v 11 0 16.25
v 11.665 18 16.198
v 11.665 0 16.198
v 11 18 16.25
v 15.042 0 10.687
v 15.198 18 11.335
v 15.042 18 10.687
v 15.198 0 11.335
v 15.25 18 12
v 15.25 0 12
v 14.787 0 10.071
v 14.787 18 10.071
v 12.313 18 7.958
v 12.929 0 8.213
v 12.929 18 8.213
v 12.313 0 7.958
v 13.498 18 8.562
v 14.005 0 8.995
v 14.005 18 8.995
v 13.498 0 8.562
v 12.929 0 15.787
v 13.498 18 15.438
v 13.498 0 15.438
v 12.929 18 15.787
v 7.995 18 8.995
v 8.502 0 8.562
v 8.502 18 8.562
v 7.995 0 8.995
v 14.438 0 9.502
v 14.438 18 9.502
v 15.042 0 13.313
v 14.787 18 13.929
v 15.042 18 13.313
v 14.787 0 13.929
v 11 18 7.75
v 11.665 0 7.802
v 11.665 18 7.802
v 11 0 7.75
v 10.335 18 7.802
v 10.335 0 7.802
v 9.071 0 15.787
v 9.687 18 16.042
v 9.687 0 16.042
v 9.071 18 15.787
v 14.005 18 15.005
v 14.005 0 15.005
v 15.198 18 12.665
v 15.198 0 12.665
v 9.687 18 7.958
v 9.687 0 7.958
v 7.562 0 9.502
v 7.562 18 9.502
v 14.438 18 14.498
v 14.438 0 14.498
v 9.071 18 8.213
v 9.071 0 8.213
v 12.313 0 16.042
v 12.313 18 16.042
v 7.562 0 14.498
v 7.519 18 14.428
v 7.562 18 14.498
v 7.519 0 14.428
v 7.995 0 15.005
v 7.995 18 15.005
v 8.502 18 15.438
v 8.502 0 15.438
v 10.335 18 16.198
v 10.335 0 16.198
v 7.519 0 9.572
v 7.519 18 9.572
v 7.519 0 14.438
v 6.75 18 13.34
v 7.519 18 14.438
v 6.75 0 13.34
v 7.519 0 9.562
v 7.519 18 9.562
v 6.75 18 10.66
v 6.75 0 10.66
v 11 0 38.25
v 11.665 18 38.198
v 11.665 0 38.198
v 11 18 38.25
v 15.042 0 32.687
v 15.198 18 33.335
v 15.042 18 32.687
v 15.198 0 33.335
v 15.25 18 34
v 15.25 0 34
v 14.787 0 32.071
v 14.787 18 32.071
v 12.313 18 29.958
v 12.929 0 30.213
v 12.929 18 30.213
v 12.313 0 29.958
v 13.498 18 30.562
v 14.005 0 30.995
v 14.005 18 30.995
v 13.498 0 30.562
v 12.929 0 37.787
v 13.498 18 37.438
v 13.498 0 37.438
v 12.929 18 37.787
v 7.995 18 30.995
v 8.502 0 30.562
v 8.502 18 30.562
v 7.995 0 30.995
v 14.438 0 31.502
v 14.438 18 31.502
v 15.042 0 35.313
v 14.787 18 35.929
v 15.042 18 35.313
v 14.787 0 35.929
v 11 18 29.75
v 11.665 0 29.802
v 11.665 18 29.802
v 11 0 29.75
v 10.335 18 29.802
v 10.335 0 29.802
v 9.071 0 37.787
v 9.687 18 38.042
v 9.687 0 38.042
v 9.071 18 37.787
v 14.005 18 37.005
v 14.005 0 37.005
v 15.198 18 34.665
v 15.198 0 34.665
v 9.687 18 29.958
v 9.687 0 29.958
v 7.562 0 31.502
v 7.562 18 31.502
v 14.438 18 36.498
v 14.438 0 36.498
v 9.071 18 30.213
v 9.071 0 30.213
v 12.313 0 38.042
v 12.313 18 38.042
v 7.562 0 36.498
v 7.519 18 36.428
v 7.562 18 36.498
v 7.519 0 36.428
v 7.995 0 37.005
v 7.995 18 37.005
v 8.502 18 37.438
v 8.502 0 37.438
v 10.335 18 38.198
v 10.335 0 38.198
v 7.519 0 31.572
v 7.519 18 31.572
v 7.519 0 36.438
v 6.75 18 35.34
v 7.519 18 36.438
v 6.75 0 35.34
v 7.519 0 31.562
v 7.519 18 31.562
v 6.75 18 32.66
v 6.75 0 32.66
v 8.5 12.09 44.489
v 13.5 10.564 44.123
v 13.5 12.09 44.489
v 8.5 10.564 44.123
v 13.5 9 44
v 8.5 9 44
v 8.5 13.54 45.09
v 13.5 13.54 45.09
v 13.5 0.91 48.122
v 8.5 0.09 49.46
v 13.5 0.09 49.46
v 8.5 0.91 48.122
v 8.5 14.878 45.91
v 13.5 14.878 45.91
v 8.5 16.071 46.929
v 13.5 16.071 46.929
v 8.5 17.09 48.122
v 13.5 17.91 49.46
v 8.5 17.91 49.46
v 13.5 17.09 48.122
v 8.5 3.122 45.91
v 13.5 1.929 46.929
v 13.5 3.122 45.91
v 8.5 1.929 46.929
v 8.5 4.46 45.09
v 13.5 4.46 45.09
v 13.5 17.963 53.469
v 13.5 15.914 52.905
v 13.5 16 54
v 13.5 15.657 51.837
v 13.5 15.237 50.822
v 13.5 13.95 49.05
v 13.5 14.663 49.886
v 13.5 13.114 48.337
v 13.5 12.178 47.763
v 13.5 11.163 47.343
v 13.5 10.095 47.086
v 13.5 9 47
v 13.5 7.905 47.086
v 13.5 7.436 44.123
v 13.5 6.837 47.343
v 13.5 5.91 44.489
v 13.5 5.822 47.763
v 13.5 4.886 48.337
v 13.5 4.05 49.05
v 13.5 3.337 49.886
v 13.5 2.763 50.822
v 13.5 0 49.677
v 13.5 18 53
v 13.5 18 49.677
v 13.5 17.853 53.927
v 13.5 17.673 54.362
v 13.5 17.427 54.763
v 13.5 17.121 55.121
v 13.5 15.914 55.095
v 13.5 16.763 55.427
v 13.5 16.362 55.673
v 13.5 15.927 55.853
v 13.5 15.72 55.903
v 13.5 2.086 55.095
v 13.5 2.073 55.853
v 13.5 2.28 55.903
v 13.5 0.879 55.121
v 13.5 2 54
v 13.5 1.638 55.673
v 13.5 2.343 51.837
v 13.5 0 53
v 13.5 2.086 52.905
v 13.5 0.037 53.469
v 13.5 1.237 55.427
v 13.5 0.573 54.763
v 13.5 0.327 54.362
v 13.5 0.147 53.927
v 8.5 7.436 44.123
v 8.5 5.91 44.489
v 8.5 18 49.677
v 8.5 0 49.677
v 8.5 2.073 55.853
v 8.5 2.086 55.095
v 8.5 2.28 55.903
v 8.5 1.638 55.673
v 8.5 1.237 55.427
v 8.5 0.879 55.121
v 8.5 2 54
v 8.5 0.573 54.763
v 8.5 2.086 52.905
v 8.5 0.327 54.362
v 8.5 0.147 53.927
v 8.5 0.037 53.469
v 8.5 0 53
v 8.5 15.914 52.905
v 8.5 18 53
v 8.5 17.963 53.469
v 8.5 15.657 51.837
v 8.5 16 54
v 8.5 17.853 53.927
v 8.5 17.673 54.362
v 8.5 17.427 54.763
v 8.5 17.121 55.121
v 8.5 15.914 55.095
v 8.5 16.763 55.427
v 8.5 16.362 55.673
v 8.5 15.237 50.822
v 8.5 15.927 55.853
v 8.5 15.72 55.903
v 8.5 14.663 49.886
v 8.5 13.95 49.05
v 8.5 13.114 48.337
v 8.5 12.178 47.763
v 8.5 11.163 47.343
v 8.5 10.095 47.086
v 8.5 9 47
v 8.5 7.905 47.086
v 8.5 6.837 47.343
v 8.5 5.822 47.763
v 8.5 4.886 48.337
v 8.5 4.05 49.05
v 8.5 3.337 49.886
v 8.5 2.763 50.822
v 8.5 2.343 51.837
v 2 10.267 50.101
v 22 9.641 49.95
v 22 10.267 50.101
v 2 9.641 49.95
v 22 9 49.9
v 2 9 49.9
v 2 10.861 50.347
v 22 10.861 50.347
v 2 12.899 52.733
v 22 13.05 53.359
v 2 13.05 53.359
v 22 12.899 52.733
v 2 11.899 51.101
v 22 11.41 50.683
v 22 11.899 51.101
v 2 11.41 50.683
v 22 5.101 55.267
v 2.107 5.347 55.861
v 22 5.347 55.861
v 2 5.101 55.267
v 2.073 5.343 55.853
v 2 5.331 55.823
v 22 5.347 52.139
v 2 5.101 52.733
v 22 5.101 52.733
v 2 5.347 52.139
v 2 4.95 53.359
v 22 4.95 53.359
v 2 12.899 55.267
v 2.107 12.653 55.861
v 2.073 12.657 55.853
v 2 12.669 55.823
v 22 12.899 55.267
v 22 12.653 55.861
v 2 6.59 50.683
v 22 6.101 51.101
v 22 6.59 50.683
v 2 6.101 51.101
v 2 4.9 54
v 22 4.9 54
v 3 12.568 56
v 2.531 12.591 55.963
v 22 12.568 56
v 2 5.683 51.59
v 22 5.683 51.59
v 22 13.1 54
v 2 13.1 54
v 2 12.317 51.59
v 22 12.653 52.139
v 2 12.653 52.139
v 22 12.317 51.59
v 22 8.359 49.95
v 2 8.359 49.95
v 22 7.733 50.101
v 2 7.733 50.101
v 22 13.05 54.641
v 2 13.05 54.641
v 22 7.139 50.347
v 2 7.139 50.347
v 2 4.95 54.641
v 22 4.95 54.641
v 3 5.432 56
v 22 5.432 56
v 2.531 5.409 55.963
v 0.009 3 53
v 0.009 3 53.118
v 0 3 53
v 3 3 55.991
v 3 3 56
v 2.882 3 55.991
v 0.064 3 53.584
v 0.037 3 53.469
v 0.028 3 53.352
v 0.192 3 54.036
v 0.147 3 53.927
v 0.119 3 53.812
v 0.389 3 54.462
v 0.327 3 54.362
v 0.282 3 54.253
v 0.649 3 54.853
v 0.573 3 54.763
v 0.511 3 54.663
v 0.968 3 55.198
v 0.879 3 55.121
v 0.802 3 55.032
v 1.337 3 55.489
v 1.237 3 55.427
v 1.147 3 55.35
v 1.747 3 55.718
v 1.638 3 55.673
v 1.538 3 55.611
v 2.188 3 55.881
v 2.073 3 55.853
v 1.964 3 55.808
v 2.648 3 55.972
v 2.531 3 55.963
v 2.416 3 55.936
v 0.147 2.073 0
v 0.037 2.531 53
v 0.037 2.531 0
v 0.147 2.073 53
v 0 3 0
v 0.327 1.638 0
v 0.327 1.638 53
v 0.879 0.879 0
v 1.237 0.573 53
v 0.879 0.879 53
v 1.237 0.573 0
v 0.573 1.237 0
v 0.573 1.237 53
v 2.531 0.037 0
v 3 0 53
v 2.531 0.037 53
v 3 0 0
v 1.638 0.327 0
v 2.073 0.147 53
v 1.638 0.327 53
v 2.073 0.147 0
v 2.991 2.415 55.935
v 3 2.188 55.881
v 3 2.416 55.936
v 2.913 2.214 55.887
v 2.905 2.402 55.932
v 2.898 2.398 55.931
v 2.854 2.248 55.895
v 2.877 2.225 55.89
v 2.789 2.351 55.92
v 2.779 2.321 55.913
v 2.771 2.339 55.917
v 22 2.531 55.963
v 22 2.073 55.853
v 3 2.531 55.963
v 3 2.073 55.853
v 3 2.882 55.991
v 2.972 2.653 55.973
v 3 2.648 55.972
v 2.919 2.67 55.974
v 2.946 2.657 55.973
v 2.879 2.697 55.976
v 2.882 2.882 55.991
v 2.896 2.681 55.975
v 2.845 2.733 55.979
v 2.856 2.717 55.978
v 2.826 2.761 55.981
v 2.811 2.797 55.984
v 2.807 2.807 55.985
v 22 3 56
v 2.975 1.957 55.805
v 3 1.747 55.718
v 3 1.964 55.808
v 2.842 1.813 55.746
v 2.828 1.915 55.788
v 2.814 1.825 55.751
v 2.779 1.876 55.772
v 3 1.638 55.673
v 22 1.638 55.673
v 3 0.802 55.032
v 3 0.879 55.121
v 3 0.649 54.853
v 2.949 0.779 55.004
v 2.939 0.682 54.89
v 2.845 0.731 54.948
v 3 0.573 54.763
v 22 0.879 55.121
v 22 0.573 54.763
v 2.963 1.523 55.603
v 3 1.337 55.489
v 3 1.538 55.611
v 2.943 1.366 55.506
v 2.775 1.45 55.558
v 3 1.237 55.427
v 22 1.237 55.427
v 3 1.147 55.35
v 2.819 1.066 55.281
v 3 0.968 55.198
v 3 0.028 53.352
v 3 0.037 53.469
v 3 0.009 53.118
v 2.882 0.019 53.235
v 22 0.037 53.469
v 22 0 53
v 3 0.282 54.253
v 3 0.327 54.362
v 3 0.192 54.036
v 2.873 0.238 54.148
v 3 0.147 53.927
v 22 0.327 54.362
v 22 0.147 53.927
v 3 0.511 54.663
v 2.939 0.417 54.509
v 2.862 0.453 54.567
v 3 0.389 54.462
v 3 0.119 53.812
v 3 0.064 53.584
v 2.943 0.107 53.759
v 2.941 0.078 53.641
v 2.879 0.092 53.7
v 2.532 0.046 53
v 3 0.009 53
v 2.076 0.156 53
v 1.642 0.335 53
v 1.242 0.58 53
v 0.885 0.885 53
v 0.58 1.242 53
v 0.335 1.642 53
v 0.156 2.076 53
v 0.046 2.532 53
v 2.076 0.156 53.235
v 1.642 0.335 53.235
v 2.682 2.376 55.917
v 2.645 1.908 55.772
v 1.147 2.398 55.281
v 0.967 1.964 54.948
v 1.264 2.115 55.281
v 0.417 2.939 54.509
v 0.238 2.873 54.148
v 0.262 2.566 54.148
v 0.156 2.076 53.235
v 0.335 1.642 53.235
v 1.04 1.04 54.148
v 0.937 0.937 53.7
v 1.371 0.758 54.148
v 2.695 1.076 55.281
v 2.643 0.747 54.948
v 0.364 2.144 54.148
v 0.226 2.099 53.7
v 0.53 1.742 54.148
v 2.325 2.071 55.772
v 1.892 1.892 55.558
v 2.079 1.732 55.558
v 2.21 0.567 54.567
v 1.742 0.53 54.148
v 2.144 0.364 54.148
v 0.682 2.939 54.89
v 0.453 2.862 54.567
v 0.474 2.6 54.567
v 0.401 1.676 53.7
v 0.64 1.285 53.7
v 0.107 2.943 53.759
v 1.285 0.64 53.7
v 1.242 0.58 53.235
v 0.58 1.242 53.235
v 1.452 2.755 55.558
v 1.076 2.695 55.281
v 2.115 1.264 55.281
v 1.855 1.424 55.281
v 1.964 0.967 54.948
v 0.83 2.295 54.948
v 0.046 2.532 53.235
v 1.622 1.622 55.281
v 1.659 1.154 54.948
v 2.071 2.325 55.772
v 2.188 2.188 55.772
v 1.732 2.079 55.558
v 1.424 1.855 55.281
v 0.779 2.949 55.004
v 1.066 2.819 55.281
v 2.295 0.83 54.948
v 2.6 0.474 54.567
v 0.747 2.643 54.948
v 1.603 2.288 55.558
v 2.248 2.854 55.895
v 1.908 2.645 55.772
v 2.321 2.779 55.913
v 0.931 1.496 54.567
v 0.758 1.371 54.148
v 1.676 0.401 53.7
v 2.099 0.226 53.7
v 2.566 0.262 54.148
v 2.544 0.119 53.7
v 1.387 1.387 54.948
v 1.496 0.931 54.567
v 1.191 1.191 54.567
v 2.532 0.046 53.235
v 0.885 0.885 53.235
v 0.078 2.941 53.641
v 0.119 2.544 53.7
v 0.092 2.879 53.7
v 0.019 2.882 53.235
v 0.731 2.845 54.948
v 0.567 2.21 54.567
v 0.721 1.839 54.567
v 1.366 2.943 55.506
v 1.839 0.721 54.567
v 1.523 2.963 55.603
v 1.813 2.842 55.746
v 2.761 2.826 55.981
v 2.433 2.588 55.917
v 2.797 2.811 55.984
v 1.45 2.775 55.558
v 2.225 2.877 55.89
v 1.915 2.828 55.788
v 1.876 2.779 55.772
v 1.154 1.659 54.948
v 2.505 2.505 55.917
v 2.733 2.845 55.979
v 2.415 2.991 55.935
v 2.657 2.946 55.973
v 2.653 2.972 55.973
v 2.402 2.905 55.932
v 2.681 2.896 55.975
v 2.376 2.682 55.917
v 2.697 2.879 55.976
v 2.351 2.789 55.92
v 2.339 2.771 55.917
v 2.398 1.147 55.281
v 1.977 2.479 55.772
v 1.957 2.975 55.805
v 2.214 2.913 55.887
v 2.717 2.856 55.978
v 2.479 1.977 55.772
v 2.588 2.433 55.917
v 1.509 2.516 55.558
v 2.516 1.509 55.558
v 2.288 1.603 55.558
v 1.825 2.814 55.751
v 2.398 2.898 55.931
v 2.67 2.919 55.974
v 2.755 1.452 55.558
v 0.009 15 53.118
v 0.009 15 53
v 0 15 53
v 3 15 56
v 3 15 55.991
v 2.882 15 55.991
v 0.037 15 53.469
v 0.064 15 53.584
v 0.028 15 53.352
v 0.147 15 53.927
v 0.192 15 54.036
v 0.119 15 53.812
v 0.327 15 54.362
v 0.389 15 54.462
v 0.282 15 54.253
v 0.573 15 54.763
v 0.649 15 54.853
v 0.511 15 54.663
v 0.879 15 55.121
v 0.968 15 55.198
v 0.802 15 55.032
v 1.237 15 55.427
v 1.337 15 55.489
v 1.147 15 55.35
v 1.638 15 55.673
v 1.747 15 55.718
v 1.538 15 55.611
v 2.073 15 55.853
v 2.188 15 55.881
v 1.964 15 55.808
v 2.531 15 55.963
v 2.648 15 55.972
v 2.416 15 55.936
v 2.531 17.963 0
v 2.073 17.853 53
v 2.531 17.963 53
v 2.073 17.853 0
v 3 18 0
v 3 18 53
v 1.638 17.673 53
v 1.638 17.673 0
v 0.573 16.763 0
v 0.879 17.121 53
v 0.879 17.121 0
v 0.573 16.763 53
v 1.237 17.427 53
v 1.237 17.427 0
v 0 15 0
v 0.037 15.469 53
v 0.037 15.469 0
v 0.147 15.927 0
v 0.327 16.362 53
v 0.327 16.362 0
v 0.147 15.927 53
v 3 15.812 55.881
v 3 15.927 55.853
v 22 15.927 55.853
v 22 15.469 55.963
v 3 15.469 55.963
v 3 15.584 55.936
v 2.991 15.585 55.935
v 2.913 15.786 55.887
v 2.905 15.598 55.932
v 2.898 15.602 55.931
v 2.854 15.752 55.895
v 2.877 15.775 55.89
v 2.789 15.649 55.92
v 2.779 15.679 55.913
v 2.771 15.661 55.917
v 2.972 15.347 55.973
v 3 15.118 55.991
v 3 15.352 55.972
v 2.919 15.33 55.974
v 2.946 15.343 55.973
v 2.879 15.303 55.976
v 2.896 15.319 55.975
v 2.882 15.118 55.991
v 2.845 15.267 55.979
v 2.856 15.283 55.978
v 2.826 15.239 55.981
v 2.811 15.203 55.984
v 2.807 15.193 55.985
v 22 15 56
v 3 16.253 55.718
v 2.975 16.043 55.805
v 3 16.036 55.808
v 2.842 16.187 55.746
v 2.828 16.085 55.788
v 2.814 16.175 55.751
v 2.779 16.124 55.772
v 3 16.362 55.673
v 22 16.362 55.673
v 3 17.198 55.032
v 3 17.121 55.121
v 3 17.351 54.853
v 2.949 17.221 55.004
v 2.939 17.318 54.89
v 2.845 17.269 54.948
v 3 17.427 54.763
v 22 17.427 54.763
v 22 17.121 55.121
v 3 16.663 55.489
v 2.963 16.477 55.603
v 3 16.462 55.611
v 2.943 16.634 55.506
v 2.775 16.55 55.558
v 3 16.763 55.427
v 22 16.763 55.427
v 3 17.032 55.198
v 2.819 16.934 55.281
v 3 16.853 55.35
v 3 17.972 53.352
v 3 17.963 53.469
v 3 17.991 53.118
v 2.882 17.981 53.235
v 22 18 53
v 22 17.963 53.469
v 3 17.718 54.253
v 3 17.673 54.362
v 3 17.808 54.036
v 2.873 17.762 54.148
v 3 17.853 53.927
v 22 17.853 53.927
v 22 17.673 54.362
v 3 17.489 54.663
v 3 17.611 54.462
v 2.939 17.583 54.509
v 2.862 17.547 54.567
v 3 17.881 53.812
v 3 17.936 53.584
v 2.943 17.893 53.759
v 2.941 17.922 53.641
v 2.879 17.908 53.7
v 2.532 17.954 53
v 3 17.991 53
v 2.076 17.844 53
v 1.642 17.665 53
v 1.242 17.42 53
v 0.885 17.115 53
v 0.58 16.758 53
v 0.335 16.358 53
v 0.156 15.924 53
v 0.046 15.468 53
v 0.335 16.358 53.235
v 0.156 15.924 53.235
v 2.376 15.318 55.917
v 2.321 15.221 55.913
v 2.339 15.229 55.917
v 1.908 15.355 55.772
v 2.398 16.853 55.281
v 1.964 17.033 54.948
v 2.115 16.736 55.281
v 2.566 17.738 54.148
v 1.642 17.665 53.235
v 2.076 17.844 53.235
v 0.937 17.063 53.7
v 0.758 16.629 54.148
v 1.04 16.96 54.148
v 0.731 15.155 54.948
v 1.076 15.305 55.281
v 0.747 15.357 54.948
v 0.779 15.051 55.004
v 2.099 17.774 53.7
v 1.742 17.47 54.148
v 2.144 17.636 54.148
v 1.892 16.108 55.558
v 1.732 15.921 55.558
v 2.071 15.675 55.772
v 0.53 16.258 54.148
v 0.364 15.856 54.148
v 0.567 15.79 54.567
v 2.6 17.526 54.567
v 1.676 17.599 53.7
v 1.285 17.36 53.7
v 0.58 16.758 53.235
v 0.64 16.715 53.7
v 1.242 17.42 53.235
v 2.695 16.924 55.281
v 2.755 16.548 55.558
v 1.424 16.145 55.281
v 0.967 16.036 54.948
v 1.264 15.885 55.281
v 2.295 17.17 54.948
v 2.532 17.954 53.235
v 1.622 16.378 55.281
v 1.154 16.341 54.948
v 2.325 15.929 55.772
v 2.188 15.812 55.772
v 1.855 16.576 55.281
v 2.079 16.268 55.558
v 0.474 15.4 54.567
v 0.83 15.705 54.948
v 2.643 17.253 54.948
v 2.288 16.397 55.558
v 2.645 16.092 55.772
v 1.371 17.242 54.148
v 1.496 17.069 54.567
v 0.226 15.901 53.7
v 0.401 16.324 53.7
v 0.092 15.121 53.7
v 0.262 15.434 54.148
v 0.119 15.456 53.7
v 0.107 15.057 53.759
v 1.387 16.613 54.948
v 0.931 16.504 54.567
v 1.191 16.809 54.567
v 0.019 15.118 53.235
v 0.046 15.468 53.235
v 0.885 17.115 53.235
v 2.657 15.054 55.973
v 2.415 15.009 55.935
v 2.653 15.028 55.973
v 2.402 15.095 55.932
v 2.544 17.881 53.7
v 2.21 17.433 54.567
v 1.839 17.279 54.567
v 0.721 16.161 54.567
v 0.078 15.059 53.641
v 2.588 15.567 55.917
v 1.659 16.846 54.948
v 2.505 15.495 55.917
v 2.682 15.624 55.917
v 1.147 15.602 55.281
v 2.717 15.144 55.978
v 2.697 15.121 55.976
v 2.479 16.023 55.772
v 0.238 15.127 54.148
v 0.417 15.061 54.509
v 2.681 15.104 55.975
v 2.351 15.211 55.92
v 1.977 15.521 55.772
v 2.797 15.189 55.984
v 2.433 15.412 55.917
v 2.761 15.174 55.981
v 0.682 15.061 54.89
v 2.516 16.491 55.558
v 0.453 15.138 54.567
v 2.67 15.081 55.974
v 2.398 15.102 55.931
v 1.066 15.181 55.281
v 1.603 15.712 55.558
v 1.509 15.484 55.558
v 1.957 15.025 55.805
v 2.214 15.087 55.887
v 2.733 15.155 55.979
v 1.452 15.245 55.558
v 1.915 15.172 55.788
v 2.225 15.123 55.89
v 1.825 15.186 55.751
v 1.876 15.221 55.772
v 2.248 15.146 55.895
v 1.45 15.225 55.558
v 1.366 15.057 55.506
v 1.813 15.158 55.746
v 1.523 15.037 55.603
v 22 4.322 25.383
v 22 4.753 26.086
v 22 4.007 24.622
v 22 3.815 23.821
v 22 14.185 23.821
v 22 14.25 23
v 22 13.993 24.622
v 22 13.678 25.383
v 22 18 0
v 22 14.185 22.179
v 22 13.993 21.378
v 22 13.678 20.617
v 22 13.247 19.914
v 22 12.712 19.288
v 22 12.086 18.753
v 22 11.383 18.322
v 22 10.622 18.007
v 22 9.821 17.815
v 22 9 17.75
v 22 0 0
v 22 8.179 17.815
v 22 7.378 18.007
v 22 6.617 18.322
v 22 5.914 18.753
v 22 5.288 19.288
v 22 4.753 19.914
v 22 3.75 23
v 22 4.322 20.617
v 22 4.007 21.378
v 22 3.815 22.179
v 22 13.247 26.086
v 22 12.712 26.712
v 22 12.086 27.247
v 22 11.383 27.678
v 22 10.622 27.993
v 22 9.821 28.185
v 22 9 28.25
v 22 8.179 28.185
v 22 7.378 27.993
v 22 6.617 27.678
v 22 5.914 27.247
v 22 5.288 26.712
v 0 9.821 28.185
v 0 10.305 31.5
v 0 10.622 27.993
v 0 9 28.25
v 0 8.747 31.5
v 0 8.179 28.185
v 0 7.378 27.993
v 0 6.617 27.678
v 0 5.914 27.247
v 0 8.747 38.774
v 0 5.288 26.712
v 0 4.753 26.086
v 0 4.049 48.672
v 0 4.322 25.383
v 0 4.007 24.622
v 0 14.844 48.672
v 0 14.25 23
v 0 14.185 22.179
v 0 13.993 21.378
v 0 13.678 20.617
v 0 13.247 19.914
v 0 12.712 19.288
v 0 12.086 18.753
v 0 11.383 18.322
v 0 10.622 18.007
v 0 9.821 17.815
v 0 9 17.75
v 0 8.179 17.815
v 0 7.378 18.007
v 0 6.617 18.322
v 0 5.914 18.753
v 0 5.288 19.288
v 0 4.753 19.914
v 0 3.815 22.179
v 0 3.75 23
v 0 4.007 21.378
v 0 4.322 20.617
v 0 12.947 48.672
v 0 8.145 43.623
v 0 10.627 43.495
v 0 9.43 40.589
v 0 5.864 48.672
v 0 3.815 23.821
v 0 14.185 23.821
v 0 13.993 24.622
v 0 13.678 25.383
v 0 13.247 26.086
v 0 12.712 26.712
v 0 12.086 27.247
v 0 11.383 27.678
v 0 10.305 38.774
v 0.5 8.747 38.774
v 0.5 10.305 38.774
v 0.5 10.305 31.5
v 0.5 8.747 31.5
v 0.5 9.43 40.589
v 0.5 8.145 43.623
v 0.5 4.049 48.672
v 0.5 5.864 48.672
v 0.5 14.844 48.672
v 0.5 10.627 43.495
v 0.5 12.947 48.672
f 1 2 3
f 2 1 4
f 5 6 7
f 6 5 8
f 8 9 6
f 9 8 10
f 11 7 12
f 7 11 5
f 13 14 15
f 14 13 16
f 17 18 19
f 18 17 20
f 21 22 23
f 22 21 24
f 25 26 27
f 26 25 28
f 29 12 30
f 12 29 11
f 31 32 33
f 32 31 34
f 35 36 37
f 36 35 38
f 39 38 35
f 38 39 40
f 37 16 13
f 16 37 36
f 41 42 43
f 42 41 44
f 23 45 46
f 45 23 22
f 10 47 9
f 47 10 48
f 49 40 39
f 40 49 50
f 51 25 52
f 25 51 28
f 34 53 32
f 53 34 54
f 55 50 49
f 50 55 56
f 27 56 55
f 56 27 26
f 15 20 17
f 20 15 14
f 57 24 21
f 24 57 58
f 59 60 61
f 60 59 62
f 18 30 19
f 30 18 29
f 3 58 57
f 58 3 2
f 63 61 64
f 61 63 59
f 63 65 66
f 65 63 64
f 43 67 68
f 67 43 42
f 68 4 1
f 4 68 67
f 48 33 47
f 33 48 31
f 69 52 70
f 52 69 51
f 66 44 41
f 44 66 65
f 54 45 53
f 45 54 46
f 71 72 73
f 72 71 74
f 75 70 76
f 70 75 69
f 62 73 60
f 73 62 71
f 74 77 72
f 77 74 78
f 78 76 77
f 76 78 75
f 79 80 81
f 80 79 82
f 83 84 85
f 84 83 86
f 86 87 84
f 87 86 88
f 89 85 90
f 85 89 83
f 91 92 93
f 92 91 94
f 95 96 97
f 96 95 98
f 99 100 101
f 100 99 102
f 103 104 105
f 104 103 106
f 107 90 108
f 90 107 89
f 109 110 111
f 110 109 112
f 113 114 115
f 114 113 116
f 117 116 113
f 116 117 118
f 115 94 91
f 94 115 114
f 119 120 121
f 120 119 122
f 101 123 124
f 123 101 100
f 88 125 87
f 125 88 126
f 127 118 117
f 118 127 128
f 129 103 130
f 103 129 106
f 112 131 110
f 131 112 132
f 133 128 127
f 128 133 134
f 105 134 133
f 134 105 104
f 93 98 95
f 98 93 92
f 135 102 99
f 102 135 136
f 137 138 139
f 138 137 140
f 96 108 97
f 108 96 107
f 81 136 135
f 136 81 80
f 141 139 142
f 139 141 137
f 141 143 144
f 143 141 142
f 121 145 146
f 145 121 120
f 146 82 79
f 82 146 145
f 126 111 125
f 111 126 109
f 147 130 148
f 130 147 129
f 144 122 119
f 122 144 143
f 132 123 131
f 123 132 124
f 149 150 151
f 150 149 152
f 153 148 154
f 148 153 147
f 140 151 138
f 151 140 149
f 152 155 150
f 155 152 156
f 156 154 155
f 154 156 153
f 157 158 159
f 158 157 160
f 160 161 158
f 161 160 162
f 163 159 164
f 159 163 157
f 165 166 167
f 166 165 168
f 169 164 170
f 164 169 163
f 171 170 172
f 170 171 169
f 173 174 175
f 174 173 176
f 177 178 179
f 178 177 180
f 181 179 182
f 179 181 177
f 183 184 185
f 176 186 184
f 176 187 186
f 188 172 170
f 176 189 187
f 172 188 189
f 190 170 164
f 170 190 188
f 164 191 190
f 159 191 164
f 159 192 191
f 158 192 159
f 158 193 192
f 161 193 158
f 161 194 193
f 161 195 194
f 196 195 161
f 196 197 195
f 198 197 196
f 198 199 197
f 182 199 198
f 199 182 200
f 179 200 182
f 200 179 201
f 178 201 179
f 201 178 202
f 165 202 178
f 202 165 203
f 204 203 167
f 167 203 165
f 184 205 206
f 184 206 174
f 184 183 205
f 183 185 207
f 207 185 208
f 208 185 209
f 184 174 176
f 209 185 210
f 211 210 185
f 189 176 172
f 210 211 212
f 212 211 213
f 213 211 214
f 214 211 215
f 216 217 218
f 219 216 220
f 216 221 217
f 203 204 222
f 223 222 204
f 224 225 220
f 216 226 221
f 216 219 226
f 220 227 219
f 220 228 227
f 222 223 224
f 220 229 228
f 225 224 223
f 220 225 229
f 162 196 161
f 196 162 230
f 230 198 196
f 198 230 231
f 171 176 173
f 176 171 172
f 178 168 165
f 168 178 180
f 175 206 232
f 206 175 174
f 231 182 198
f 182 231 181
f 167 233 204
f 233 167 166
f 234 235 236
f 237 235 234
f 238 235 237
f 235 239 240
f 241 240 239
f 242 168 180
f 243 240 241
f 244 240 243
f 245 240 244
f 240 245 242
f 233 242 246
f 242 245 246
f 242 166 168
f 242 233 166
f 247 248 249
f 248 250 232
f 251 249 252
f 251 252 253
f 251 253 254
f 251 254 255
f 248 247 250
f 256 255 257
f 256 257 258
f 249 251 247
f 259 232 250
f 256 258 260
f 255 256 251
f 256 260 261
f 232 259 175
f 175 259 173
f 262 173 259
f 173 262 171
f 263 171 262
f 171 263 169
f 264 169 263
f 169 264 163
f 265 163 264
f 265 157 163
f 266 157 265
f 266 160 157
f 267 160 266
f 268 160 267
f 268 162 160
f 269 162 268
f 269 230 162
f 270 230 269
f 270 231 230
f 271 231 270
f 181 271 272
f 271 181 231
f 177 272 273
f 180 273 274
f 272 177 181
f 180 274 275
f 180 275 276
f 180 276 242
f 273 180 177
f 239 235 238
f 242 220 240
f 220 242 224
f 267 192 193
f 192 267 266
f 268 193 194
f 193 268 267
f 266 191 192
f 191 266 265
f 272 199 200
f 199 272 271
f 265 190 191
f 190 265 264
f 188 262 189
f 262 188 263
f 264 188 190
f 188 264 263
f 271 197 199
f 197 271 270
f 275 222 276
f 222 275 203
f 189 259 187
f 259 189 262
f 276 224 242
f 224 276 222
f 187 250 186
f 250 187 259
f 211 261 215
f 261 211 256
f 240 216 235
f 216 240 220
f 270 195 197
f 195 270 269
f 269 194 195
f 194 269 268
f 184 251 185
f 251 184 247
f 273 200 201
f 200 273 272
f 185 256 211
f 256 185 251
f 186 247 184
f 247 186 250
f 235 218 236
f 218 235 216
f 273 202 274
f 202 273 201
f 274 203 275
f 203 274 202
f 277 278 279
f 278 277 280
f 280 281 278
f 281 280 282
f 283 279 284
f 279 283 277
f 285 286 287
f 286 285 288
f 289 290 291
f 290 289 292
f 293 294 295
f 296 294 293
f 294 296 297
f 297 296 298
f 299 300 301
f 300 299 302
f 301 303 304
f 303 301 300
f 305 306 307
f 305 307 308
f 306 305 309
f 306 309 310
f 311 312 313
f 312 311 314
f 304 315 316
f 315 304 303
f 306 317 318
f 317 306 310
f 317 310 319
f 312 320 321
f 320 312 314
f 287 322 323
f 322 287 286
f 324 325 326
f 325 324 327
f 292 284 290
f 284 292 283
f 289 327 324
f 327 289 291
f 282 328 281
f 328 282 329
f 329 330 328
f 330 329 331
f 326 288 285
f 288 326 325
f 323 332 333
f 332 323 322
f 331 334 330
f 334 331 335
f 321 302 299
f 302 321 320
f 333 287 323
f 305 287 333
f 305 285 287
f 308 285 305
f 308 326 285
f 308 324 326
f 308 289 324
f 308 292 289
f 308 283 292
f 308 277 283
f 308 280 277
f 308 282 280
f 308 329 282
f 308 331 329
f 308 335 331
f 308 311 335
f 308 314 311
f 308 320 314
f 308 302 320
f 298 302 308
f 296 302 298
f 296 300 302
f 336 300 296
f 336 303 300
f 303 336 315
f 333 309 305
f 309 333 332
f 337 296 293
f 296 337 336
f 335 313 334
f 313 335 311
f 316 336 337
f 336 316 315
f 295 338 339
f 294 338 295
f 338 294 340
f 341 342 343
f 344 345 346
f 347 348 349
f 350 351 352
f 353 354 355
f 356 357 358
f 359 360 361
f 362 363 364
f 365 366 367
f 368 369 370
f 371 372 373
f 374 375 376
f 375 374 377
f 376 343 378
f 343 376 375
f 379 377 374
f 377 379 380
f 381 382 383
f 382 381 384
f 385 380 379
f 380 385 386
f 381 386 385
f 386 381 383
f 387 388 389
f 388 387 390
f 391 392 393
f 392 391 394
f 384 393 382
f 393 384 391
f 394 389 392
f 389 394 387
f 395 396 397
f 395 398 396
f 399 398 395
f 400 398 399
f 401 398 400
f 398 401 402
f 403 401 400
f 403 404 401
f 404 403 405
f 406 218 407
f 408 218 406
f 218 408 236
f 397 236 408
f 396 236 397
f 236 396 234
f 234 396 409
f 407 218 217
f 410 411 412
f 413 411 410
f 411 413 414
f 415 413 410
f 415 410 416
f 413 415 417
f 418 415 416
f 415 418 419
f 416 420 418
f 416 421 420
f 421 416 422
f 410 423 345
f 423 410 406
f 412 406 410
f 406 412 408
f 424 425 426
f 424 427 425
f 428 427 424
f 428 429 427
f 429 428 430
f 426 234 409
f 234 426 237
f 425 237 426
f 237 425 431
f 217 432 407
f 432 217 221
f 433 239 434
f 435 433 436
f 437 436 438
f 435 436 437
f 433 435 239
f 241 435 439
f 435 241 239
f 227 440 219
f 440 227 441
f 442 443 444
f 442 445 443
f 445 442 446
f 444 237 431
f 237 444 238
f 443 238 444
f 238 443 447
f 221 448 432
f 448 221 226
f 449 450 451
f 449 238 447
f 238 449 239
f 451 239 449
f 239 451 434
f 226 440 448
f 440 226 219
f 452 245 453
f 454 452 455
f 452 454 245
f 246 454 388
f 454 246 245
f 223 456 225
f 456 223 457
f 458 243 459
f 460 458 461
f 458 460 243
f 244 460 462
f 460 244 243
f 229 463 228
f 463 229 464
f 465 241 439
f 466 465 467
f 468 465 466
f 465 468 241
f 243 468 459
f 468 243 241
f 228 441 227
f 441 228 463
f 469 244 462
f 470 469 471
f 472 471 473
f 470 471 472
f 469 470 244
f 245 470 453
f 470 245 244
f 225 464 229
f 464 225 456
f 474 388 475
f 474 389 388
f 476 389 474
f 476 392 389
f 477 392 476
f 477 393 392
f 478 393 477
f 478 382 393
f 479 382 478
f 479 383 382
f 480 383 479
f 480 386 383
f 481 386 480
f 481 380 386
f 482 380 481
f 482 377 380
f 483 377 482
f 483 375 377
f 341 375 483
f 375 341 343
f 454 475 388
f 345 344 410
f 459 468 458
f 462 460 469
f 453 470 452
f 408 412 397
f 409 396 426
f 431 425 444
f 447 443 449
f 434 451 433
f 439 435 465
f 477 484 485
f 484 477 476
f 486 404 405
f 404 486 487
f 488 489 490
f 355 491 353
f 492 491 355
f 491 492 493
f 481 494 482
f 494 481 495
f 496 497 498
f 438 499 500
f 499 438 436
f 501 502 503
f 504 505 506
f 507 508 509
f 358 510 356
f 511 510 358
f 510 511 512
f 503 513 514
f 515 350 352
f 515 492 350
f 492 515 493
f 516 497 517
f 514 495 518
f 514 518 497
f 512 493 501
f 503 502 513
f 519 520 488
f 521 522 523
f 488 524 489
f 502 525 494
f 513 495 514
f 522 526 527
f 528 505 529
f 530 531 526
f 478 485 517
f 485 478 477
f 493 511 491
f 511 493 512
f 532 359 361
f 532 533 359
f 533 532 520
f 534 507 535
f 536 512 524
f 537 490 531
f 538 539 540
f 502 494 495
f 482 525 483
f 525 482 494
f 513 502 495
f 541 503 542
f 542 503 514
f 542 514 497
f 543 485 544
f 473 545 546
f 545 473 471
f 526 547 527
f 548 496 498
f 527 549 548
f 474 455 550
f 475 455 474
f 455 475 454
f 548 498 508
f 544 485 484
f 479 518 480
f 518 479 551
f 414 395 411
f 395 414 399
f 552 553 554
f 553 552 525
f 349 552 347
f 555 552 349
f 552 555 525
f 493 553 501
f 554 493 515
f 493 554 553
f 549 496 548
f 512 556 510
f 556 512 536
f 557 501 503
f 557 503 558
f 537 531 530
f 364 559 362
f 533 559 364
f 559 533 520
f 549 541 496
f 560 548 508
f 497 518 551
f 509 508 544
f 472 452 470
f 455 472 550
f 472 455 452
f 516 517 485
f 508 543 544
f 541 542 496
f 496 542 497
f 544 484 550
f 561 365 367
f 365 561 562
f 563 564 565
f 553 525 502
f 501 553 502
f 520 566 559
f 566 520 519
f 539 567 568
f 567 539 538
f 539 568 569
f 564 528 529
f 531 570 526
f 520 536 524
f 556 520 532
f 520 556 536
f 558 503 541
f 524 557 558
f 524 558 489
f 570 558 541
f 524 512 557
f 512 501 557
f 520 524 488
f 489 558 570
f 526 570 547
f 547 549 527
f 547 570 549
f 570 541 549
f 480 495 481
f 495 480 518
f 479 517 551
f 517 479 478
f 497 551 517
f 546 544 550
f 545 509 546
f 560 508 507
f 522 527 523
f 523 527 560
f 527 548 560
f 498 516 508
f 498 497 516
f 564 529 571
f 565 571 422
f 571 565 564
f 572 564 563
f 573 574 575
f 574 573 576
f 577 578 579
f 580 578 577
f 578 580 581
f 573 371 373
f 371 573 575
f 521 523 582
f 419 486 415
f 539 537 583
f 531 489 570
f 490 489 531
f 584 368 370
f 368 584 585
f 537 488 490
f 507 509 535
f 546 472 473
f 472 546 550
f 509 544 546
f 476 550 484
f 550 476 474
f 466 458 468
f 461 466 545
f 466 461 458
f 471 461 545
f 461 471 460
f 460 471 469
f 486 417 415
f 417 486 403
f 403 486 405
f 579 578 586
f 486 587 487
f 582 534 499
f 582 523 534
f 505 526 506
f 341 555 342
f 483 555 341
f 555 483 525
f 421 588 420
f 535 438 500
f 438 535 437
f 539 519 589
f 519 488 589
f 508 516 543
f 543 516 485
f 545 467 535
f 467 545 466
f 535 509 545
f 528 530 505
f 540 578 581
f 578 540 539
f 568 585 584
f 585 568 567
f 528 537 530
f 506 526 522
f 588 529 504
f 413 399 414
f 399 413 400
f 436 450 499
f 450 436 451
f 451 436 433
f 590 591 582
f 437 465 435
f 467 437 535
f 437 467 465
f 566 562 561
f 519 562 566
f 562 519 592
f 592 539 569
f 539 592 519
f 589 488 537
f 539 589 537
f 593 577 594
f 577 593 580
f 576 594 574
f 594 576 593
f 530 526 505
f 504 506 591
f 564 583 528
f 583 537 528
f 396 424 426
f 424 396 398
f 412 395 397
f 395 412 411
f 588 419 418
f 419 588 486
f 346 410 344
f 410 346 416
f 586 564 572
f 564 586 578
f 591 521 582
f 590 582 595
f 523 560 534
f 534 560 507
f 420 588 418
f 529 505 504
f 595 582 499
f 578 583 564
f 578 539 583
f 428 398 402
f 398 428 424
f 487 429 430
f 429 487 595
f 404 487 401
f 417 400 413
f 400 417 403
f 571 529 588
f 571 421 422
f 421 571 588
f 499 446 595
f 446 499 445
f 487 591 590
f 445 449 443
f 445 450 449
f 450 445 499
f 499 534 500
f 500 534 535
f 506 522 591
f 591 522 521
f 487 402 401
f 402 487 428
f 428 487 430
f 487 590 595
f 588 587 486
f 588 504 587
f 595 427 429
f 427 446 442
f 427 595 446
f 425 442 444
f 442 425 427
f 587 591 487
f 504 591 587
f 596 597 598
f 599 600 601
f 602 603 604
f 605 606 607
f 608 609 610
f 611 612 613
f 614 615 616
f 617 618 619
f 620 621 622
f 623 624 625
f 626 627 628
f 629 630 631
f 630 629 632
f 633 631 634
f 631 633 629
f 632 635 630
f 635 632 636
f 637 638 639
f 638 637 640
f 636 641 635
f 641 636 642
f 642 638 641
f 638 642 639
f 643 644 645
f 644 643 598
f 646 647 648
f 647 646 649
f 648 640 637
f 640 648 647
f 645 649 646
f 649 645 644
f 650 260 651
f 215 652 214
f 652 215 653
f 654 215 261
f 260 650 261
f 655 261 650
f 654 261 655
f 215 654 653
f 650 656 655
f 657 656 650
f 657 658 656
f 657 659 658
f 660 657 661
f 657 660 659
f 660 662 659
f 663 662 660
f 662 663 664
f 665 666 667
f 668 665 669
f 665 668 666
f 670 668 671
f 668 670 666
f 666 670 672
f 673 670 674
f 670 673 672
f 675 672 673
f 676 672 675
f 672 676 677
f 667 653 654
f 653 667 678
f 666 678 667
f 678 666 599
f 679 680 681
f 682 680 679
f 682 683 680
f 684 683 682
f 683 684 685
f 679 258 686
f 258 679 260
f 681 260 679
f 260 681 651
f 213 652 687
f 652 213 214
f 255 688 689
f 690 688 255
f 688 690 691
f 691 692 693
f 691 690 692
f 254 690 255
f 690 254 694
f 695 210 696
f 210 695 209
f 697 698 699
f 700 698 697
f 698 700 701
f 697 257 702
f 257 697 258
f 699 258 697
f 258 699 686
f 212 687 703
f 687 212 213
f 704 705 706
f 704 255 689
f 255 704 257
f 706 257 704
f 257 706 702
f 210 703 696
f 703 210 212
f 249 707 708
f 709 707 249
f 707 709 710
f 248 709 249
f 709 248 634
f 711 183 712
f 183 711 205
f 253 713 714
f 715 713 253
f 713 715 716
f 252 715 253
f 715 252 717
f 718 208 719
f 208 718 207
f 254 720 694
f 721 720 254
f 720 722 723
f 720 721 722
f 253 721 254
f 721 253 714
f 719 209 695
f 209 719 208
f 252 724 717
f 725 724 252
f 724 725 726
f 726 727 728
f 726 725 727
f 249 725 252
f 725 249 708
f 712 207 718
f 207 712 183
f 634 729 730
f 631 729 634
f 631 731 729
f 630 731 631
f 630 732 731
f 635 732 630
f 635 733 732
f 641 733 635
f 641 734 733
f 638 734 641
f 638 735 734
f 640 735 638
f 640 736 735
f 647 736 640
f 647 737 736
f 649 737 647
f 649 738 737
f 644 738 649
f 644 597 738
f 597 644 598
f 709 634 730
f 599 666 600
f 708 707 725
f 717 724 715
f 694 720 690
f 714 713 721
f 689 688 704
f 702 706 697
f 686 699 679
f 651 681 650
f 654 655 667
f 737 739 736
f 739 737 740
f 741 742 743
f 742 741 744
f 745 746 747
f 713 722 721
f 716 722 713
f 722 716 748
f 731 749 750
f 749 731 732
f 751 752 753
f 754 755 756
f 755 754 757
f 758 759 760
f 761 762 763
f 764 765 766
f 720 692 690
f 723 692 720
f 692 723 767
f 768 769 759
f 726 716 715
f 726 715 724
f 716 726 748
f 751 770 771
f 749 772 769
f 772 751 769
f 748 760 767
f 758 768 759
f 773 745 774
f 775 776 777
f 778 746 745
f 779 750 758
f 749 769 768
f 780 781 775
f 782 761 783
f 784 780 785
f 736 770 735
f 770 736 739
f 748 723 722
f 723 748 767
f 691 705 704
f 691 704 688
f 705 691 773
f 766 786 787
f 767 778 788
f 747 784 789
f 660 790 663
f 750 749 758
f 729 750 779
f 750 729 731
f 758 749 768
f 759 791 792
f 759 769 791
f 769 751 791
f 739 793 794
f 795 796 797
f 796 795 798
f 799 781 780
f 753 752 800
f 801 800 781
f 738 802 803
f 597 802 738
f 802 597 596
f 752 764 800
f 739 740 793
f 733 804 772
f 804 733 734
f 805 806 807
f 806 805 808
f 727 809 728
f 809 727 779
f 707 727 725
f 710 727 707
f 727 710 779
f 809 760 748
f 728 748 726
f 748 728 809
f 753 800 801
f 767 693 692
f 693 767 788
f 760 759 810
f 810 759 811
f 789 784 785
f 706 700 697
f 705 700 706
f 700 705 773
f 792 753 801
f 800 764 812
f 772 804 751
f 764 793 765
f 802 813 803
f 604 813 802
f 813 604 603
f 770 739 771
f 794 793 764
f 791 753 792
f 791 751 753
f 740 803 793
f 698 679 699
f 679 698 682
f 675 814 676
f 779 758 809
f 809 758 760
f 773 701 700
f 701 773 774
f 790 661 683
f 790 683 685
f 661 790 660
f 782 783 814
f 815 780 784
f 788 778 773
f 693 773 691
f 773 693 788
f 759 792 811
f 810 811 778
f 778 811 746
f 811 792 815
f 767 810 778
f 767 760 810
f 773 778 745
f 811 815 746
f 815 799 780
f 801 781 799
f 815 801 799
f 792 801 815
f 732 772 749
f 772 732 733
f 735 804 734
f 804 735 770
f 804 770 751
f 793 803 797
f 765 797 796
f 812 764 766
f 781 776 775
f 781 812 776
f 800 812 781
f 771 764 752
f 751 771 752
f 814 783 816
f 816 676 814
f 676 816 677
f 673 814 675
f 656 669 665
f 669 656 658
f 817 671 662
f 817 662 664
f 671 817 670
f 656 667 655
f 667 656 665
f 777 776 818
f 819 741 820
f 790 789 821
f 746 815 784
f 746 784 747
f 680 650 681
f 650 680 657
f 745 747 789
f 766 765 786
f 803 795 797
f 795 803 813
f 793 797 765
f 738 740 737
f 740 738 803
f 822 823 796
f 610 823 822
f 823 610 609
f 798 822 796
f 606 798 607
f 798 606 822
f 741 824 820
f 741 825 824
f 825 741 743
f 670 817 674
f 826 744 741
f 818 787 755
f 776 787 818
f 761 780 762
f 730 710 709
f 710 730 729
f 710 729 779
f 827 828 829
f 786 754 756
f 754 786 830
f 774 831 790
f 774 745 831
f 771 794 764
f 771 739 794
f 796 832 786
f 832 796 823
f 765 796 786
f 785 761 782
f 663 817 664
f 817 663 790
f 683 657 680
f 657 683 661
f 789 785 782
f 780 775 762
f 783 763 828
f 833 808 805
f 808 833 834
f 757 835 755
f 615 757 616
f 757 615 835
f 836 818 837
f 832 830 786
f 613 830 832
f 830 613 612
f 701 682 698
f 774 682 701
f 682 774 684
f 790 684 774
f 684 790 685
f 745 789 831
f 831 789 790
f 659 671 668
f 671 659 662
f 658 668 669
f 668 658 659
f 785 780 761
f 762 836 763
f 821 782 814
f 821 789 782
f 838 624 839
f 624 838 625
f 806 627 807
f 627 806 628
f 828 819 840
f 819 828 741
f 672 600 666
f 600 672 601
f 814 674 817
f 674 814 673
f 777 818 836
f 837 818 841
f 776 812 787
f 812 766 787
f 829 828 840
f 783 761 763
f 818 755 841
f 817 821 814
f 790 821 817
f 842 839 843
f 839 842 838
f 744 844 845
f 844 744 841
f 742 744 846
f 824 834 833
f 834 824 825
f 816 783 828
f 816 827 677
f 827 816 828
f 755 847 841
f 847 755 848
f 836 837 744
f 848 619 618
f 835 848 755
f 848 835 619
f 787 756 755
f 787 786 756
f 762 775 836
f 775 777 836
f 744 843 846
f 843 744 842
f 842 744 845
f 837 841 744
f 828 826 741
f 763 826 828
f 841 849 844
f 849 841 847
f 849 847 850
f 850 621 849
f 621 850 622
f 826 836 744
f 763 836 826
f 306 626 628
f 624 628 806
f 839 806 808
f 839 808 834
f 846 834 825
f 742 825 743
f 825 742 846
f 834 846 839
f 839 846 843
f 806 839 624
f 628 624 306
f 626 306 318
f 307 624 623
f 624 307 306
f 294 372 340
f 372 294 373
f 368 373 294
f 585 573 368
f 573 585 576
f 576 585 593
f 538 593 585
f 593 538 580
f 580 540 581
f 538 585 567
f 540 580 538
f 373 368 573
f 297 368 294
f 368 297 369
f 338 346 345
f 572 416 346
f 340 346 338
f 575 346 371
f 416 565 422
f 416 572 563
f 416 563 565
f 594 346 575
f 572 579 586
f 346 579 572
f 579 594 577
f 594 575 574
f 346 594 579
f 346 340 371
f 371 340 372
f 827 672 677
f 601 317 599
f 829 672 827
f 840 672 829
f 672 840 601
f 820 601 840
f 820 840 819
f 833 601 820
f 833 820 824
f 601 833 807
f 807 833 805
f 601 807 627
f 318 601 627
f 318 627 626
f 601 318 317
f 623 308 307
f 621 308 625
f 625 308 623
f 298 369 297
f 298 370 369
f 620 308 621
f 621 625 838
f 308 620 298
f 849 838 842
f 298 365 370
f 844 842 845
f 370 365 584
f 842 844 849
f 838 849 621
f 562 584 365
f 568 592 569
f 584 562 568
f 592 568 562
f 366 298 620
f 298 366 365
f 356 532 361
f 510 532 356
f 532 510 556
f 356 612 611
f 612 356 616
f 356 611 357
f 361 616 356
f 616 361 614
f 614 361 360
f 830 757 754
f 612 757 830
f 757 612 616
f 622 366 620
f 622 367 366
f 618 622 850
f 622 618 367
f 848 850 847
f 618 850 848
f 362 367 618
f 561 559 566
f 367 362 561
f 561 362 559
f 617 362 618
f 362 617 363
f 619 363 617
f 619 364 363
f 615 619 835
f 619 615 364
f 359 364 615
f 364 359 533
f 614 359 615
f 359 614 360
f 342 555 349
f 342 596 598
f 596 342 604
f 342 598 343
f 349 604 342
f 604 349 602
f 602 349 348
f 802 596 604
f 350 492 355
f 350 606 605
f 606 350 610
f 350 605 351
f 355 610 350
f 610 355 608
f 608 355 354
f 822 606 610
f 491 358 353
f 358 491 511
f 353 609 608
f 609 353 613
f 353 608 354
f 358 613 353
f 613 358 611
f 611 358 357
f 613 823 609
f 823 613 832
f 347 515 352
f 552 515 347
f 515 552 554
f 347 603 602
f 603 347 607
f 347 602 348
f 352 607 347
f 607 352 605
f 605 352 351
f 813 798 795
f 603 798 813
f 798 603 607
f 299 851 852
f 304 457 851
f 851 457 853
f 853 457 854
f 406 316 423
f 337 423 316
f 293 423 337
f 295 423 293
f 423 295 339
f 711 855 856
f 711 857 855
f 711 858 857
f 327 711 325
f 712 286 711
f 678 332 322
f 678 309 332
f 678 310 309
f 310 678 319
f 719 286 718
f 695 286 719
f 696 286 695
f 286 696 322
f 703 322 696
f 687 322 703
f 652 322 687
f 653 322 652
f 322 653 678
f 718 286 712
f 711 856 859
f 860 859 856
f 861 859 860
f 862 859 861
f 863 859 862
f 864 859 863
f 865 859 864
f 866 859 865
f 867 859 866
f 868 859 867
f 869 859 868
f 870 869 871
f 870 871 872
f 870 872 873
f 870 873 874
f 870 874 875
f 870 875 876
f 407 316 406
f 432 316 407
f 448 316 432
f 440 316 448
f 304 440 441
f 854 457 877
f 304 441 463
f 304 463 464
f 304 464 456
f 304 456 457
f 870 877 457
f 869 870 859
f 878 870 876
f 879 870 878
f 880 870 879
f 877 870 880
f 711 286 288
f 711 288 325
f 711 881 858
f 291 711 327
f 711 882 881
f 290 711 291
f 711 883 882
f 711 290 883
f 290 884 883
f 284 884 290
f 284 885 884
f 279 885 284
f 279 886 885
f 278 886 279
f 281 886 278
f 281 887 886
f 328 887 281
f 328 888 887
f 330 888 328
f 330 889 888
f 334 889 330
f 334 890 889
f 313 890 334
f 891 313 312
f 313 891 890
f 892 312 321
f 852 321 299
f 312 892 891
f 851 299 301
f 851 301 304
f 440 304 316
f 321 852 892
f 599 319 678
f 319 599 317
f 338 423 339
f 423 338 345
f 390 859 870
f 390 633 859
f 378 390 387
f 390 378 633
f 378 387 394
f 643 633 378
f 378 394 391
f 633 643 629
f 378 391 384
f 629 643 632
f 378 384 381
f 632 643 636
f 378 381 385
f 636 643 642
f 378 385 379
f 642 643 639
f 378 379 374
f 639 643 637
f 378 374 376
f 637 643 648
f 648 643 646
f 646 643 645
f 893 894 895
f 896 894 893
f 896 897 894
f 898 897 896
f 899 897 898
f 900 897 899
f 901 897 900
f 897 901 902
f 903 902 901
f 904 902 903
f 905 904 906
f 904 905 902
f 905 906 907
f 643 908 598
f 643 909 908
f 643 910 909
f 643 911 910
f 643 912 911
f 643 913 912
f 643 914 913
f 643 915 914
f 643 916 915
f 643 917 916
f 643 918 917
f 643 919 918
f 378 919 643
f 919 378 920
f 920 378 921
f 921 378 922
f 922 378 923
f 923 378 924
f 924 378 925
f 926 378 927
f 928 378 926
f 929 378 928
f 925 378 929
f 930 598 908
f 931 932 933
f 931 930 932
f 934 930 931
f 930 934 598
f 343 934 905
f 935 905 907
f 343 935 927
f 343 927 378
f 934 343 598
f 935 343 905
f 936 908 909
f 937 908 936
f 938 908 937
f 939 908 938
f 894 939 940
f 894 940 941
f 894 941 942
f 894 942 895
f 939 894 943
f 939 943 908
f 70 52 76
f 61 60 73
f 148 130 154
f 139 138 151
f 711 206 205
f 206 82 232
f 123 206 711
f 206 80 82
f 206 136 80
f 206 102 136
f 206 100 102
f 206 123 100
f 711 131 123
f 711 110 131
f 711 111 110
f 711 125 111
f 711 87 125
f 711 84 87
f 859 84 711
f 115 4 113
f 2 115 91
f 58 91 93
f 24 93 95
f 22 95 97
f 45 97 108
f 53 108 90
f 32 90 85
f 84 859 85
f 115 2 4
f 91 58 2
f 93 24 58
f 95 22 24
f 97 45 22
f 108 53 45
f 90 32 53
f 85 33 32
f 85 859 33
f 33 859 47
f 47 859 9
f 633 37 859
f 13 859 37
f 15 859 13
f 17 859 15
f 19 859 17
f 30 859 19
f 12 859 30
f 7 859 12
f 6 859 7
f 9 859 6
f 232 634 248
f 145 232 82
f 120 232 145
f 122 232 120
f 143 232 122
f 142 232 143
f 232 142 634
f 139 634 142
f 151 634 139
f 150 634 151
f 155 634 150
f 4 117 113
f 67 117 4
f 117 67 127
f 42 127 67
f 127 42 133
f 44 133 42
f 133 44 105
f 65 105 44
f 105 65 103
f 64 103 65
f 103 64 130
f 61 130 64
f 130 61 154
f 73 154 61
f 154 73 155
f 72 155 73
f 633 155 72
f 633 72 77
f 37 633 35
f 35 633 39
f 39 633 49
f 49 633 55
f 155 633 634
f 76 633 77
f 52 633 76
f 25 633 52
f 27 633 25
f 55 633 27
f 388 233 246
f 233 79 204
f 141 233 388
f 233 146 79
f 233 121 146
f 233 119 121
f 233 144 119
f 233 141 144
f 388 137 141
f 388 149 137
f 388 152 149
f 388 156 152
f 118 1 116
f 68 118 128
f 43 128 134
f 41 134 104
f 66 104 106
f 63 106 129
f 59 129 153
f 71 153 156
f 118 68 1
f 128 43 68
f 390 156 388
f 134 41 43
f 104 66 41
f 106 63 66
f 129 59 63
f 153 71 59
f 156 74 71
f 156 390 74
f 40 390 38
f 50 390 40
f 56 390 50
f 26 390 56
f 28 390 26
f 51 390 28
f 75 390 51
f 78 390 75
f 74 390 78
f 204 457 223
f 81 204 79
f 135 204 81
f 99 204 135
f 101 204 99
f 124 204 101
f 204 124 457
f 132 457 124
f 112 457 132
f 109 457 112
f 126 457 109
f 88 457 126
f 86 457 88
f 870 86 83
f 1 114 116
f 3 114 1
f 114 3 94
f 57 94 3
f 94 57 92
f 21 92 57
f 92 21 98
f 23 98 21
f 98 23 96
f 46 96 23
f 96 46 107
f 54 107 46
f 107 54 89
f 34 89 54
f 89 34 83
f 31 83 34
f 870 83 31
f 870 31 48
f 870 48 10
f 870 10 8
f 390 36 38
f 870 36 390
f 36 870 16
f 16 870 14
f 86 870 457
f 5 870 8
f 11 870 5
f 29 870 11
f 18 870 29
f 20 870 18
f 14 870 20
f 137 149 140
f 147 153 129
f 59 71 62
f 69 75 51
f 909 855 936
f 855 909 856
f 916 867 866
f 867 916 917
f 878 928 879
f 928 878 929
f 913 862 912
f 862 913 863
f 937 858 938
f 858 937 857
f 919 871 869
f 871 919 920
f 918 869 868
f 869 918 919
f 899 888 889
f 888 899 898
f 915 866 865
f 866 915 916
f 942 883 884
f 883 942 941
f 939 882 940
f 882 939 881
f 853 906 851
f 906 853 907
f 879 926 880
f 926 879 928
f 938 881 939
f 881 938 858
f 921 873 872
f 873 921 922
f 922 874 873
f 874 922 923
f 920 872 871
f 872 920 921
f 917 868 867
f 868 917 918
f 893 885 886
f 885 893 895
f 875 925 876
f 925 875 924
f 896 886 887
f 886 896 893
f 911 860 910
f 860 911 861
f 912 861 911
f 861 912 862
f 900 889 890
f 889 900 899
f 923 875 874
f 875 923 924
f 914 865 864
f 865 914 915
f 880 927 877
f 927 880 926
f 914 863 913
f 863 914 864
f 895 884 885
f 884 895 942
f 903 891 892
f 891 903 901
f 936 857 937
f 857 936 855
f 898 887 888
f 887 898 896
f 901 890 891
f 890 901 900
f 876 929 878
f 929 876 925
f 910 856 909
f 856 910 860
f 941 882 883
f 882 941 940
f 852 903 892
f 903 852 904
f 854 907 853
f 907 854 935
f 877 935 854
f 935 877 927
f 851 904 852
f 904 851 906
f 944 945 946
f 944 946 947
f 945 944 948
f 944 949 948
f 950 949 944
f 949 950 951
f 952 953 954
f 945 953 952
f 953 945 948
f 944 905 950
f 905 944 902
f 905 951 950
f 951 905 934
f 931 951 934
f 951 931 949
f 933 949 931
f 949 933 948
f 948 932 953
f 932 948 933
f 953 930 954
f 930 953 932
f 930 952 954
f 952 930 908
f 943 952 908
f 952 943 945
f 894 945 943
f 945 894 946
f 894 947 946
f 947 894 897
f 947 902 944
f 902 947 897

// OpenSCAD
H=56;
W=18;
L=22;

threaded_Y_D=10.5;
threaded_X_D=8.5;
plain_D=8.2;

fillet=3;

support=1;
supported_angle=55;

include <write/Write.scad>

module fillet(r, h, pos, rot)
{
	translate(pos)
	rotate(rot)
	translate([-r,-r,0])
		difference()
		{
			translate([0,0,-h/2])
				cube([r*2,r*2,h]);
			cylinder(r=r, h=h+2, center=true);
		}
}

sca=supported_angle;
module supported_cylinder(r=1,h=1,z_rot=0, center=false)
{
	union()
	{
		cylinder(r=r,h=h,center=center);
		if(support)
		rotate([0,0,z_rot])
		linear_extrude(height=h, center=center)
			polygon([[r*sin(sca),r*cos(sca)], [r, r*(cos(sca)-tan(sca)*(1-sin(sca)))], [r, -r*(cos(sca)-tan(sca)*(1-sin(sca)))],[r*sin(sca),-r*cos(sca)]]);
	}
}


module sphere_fillet(r,pos,rot)
{
	translate(pos)
	rotate(rot)
	translate([-r,-r,-r])
		difference()
		{
			cube([r*2,r*2,r*2]);
			sphere(r=r);
		}
}


module Y_corner()
{
	difference()
	{
		cube([L,W,H]);
		for(i=[0,1])
			translate([L/2, -1, 12+22*i])
				rotate([-90,0,0])
					supported_cylinder(r=threaded_X_D/2, h=W+2, z_rot=180);
		translate([-1, W/2, 23])
			rotate([0,90,0])
				cylinder(r=threaded_Y_D/2, h=L+2);
		translate([0, W/2, 54])
			rotate([0,90,0])
			{
				translate([0,0,2])
					cylinder(r=plain_D/2, h=L);
				translate([0,0,L/2])
					difference()
					{
						cylinder(r=W/2+1, h=5, center=true);
						cylinder(r=W/2-2, h=7, center=true);
					}
				
			}
		for(i=[0,1])
		{
			fillet(fillet,H+2,[0,W*i,H/2],[0,0,180-90*i]);
			fillet(fillet,L+2,[L/2,W*i,H],[180*(i-1),-90,0]);
			sphere_fillet(fillet,[0,W*i,H],[0,0,180-90*i]);
		}
		fillet(fillet,W+2,[0,W/2,H],[90,-90,0]);
		translate([0,W/2,40])
			rotate([90,0,-90])
				scale([17/h,17/h,-1])
					write("Y",center=true);
	}
}


Y_corner($fn=40);
